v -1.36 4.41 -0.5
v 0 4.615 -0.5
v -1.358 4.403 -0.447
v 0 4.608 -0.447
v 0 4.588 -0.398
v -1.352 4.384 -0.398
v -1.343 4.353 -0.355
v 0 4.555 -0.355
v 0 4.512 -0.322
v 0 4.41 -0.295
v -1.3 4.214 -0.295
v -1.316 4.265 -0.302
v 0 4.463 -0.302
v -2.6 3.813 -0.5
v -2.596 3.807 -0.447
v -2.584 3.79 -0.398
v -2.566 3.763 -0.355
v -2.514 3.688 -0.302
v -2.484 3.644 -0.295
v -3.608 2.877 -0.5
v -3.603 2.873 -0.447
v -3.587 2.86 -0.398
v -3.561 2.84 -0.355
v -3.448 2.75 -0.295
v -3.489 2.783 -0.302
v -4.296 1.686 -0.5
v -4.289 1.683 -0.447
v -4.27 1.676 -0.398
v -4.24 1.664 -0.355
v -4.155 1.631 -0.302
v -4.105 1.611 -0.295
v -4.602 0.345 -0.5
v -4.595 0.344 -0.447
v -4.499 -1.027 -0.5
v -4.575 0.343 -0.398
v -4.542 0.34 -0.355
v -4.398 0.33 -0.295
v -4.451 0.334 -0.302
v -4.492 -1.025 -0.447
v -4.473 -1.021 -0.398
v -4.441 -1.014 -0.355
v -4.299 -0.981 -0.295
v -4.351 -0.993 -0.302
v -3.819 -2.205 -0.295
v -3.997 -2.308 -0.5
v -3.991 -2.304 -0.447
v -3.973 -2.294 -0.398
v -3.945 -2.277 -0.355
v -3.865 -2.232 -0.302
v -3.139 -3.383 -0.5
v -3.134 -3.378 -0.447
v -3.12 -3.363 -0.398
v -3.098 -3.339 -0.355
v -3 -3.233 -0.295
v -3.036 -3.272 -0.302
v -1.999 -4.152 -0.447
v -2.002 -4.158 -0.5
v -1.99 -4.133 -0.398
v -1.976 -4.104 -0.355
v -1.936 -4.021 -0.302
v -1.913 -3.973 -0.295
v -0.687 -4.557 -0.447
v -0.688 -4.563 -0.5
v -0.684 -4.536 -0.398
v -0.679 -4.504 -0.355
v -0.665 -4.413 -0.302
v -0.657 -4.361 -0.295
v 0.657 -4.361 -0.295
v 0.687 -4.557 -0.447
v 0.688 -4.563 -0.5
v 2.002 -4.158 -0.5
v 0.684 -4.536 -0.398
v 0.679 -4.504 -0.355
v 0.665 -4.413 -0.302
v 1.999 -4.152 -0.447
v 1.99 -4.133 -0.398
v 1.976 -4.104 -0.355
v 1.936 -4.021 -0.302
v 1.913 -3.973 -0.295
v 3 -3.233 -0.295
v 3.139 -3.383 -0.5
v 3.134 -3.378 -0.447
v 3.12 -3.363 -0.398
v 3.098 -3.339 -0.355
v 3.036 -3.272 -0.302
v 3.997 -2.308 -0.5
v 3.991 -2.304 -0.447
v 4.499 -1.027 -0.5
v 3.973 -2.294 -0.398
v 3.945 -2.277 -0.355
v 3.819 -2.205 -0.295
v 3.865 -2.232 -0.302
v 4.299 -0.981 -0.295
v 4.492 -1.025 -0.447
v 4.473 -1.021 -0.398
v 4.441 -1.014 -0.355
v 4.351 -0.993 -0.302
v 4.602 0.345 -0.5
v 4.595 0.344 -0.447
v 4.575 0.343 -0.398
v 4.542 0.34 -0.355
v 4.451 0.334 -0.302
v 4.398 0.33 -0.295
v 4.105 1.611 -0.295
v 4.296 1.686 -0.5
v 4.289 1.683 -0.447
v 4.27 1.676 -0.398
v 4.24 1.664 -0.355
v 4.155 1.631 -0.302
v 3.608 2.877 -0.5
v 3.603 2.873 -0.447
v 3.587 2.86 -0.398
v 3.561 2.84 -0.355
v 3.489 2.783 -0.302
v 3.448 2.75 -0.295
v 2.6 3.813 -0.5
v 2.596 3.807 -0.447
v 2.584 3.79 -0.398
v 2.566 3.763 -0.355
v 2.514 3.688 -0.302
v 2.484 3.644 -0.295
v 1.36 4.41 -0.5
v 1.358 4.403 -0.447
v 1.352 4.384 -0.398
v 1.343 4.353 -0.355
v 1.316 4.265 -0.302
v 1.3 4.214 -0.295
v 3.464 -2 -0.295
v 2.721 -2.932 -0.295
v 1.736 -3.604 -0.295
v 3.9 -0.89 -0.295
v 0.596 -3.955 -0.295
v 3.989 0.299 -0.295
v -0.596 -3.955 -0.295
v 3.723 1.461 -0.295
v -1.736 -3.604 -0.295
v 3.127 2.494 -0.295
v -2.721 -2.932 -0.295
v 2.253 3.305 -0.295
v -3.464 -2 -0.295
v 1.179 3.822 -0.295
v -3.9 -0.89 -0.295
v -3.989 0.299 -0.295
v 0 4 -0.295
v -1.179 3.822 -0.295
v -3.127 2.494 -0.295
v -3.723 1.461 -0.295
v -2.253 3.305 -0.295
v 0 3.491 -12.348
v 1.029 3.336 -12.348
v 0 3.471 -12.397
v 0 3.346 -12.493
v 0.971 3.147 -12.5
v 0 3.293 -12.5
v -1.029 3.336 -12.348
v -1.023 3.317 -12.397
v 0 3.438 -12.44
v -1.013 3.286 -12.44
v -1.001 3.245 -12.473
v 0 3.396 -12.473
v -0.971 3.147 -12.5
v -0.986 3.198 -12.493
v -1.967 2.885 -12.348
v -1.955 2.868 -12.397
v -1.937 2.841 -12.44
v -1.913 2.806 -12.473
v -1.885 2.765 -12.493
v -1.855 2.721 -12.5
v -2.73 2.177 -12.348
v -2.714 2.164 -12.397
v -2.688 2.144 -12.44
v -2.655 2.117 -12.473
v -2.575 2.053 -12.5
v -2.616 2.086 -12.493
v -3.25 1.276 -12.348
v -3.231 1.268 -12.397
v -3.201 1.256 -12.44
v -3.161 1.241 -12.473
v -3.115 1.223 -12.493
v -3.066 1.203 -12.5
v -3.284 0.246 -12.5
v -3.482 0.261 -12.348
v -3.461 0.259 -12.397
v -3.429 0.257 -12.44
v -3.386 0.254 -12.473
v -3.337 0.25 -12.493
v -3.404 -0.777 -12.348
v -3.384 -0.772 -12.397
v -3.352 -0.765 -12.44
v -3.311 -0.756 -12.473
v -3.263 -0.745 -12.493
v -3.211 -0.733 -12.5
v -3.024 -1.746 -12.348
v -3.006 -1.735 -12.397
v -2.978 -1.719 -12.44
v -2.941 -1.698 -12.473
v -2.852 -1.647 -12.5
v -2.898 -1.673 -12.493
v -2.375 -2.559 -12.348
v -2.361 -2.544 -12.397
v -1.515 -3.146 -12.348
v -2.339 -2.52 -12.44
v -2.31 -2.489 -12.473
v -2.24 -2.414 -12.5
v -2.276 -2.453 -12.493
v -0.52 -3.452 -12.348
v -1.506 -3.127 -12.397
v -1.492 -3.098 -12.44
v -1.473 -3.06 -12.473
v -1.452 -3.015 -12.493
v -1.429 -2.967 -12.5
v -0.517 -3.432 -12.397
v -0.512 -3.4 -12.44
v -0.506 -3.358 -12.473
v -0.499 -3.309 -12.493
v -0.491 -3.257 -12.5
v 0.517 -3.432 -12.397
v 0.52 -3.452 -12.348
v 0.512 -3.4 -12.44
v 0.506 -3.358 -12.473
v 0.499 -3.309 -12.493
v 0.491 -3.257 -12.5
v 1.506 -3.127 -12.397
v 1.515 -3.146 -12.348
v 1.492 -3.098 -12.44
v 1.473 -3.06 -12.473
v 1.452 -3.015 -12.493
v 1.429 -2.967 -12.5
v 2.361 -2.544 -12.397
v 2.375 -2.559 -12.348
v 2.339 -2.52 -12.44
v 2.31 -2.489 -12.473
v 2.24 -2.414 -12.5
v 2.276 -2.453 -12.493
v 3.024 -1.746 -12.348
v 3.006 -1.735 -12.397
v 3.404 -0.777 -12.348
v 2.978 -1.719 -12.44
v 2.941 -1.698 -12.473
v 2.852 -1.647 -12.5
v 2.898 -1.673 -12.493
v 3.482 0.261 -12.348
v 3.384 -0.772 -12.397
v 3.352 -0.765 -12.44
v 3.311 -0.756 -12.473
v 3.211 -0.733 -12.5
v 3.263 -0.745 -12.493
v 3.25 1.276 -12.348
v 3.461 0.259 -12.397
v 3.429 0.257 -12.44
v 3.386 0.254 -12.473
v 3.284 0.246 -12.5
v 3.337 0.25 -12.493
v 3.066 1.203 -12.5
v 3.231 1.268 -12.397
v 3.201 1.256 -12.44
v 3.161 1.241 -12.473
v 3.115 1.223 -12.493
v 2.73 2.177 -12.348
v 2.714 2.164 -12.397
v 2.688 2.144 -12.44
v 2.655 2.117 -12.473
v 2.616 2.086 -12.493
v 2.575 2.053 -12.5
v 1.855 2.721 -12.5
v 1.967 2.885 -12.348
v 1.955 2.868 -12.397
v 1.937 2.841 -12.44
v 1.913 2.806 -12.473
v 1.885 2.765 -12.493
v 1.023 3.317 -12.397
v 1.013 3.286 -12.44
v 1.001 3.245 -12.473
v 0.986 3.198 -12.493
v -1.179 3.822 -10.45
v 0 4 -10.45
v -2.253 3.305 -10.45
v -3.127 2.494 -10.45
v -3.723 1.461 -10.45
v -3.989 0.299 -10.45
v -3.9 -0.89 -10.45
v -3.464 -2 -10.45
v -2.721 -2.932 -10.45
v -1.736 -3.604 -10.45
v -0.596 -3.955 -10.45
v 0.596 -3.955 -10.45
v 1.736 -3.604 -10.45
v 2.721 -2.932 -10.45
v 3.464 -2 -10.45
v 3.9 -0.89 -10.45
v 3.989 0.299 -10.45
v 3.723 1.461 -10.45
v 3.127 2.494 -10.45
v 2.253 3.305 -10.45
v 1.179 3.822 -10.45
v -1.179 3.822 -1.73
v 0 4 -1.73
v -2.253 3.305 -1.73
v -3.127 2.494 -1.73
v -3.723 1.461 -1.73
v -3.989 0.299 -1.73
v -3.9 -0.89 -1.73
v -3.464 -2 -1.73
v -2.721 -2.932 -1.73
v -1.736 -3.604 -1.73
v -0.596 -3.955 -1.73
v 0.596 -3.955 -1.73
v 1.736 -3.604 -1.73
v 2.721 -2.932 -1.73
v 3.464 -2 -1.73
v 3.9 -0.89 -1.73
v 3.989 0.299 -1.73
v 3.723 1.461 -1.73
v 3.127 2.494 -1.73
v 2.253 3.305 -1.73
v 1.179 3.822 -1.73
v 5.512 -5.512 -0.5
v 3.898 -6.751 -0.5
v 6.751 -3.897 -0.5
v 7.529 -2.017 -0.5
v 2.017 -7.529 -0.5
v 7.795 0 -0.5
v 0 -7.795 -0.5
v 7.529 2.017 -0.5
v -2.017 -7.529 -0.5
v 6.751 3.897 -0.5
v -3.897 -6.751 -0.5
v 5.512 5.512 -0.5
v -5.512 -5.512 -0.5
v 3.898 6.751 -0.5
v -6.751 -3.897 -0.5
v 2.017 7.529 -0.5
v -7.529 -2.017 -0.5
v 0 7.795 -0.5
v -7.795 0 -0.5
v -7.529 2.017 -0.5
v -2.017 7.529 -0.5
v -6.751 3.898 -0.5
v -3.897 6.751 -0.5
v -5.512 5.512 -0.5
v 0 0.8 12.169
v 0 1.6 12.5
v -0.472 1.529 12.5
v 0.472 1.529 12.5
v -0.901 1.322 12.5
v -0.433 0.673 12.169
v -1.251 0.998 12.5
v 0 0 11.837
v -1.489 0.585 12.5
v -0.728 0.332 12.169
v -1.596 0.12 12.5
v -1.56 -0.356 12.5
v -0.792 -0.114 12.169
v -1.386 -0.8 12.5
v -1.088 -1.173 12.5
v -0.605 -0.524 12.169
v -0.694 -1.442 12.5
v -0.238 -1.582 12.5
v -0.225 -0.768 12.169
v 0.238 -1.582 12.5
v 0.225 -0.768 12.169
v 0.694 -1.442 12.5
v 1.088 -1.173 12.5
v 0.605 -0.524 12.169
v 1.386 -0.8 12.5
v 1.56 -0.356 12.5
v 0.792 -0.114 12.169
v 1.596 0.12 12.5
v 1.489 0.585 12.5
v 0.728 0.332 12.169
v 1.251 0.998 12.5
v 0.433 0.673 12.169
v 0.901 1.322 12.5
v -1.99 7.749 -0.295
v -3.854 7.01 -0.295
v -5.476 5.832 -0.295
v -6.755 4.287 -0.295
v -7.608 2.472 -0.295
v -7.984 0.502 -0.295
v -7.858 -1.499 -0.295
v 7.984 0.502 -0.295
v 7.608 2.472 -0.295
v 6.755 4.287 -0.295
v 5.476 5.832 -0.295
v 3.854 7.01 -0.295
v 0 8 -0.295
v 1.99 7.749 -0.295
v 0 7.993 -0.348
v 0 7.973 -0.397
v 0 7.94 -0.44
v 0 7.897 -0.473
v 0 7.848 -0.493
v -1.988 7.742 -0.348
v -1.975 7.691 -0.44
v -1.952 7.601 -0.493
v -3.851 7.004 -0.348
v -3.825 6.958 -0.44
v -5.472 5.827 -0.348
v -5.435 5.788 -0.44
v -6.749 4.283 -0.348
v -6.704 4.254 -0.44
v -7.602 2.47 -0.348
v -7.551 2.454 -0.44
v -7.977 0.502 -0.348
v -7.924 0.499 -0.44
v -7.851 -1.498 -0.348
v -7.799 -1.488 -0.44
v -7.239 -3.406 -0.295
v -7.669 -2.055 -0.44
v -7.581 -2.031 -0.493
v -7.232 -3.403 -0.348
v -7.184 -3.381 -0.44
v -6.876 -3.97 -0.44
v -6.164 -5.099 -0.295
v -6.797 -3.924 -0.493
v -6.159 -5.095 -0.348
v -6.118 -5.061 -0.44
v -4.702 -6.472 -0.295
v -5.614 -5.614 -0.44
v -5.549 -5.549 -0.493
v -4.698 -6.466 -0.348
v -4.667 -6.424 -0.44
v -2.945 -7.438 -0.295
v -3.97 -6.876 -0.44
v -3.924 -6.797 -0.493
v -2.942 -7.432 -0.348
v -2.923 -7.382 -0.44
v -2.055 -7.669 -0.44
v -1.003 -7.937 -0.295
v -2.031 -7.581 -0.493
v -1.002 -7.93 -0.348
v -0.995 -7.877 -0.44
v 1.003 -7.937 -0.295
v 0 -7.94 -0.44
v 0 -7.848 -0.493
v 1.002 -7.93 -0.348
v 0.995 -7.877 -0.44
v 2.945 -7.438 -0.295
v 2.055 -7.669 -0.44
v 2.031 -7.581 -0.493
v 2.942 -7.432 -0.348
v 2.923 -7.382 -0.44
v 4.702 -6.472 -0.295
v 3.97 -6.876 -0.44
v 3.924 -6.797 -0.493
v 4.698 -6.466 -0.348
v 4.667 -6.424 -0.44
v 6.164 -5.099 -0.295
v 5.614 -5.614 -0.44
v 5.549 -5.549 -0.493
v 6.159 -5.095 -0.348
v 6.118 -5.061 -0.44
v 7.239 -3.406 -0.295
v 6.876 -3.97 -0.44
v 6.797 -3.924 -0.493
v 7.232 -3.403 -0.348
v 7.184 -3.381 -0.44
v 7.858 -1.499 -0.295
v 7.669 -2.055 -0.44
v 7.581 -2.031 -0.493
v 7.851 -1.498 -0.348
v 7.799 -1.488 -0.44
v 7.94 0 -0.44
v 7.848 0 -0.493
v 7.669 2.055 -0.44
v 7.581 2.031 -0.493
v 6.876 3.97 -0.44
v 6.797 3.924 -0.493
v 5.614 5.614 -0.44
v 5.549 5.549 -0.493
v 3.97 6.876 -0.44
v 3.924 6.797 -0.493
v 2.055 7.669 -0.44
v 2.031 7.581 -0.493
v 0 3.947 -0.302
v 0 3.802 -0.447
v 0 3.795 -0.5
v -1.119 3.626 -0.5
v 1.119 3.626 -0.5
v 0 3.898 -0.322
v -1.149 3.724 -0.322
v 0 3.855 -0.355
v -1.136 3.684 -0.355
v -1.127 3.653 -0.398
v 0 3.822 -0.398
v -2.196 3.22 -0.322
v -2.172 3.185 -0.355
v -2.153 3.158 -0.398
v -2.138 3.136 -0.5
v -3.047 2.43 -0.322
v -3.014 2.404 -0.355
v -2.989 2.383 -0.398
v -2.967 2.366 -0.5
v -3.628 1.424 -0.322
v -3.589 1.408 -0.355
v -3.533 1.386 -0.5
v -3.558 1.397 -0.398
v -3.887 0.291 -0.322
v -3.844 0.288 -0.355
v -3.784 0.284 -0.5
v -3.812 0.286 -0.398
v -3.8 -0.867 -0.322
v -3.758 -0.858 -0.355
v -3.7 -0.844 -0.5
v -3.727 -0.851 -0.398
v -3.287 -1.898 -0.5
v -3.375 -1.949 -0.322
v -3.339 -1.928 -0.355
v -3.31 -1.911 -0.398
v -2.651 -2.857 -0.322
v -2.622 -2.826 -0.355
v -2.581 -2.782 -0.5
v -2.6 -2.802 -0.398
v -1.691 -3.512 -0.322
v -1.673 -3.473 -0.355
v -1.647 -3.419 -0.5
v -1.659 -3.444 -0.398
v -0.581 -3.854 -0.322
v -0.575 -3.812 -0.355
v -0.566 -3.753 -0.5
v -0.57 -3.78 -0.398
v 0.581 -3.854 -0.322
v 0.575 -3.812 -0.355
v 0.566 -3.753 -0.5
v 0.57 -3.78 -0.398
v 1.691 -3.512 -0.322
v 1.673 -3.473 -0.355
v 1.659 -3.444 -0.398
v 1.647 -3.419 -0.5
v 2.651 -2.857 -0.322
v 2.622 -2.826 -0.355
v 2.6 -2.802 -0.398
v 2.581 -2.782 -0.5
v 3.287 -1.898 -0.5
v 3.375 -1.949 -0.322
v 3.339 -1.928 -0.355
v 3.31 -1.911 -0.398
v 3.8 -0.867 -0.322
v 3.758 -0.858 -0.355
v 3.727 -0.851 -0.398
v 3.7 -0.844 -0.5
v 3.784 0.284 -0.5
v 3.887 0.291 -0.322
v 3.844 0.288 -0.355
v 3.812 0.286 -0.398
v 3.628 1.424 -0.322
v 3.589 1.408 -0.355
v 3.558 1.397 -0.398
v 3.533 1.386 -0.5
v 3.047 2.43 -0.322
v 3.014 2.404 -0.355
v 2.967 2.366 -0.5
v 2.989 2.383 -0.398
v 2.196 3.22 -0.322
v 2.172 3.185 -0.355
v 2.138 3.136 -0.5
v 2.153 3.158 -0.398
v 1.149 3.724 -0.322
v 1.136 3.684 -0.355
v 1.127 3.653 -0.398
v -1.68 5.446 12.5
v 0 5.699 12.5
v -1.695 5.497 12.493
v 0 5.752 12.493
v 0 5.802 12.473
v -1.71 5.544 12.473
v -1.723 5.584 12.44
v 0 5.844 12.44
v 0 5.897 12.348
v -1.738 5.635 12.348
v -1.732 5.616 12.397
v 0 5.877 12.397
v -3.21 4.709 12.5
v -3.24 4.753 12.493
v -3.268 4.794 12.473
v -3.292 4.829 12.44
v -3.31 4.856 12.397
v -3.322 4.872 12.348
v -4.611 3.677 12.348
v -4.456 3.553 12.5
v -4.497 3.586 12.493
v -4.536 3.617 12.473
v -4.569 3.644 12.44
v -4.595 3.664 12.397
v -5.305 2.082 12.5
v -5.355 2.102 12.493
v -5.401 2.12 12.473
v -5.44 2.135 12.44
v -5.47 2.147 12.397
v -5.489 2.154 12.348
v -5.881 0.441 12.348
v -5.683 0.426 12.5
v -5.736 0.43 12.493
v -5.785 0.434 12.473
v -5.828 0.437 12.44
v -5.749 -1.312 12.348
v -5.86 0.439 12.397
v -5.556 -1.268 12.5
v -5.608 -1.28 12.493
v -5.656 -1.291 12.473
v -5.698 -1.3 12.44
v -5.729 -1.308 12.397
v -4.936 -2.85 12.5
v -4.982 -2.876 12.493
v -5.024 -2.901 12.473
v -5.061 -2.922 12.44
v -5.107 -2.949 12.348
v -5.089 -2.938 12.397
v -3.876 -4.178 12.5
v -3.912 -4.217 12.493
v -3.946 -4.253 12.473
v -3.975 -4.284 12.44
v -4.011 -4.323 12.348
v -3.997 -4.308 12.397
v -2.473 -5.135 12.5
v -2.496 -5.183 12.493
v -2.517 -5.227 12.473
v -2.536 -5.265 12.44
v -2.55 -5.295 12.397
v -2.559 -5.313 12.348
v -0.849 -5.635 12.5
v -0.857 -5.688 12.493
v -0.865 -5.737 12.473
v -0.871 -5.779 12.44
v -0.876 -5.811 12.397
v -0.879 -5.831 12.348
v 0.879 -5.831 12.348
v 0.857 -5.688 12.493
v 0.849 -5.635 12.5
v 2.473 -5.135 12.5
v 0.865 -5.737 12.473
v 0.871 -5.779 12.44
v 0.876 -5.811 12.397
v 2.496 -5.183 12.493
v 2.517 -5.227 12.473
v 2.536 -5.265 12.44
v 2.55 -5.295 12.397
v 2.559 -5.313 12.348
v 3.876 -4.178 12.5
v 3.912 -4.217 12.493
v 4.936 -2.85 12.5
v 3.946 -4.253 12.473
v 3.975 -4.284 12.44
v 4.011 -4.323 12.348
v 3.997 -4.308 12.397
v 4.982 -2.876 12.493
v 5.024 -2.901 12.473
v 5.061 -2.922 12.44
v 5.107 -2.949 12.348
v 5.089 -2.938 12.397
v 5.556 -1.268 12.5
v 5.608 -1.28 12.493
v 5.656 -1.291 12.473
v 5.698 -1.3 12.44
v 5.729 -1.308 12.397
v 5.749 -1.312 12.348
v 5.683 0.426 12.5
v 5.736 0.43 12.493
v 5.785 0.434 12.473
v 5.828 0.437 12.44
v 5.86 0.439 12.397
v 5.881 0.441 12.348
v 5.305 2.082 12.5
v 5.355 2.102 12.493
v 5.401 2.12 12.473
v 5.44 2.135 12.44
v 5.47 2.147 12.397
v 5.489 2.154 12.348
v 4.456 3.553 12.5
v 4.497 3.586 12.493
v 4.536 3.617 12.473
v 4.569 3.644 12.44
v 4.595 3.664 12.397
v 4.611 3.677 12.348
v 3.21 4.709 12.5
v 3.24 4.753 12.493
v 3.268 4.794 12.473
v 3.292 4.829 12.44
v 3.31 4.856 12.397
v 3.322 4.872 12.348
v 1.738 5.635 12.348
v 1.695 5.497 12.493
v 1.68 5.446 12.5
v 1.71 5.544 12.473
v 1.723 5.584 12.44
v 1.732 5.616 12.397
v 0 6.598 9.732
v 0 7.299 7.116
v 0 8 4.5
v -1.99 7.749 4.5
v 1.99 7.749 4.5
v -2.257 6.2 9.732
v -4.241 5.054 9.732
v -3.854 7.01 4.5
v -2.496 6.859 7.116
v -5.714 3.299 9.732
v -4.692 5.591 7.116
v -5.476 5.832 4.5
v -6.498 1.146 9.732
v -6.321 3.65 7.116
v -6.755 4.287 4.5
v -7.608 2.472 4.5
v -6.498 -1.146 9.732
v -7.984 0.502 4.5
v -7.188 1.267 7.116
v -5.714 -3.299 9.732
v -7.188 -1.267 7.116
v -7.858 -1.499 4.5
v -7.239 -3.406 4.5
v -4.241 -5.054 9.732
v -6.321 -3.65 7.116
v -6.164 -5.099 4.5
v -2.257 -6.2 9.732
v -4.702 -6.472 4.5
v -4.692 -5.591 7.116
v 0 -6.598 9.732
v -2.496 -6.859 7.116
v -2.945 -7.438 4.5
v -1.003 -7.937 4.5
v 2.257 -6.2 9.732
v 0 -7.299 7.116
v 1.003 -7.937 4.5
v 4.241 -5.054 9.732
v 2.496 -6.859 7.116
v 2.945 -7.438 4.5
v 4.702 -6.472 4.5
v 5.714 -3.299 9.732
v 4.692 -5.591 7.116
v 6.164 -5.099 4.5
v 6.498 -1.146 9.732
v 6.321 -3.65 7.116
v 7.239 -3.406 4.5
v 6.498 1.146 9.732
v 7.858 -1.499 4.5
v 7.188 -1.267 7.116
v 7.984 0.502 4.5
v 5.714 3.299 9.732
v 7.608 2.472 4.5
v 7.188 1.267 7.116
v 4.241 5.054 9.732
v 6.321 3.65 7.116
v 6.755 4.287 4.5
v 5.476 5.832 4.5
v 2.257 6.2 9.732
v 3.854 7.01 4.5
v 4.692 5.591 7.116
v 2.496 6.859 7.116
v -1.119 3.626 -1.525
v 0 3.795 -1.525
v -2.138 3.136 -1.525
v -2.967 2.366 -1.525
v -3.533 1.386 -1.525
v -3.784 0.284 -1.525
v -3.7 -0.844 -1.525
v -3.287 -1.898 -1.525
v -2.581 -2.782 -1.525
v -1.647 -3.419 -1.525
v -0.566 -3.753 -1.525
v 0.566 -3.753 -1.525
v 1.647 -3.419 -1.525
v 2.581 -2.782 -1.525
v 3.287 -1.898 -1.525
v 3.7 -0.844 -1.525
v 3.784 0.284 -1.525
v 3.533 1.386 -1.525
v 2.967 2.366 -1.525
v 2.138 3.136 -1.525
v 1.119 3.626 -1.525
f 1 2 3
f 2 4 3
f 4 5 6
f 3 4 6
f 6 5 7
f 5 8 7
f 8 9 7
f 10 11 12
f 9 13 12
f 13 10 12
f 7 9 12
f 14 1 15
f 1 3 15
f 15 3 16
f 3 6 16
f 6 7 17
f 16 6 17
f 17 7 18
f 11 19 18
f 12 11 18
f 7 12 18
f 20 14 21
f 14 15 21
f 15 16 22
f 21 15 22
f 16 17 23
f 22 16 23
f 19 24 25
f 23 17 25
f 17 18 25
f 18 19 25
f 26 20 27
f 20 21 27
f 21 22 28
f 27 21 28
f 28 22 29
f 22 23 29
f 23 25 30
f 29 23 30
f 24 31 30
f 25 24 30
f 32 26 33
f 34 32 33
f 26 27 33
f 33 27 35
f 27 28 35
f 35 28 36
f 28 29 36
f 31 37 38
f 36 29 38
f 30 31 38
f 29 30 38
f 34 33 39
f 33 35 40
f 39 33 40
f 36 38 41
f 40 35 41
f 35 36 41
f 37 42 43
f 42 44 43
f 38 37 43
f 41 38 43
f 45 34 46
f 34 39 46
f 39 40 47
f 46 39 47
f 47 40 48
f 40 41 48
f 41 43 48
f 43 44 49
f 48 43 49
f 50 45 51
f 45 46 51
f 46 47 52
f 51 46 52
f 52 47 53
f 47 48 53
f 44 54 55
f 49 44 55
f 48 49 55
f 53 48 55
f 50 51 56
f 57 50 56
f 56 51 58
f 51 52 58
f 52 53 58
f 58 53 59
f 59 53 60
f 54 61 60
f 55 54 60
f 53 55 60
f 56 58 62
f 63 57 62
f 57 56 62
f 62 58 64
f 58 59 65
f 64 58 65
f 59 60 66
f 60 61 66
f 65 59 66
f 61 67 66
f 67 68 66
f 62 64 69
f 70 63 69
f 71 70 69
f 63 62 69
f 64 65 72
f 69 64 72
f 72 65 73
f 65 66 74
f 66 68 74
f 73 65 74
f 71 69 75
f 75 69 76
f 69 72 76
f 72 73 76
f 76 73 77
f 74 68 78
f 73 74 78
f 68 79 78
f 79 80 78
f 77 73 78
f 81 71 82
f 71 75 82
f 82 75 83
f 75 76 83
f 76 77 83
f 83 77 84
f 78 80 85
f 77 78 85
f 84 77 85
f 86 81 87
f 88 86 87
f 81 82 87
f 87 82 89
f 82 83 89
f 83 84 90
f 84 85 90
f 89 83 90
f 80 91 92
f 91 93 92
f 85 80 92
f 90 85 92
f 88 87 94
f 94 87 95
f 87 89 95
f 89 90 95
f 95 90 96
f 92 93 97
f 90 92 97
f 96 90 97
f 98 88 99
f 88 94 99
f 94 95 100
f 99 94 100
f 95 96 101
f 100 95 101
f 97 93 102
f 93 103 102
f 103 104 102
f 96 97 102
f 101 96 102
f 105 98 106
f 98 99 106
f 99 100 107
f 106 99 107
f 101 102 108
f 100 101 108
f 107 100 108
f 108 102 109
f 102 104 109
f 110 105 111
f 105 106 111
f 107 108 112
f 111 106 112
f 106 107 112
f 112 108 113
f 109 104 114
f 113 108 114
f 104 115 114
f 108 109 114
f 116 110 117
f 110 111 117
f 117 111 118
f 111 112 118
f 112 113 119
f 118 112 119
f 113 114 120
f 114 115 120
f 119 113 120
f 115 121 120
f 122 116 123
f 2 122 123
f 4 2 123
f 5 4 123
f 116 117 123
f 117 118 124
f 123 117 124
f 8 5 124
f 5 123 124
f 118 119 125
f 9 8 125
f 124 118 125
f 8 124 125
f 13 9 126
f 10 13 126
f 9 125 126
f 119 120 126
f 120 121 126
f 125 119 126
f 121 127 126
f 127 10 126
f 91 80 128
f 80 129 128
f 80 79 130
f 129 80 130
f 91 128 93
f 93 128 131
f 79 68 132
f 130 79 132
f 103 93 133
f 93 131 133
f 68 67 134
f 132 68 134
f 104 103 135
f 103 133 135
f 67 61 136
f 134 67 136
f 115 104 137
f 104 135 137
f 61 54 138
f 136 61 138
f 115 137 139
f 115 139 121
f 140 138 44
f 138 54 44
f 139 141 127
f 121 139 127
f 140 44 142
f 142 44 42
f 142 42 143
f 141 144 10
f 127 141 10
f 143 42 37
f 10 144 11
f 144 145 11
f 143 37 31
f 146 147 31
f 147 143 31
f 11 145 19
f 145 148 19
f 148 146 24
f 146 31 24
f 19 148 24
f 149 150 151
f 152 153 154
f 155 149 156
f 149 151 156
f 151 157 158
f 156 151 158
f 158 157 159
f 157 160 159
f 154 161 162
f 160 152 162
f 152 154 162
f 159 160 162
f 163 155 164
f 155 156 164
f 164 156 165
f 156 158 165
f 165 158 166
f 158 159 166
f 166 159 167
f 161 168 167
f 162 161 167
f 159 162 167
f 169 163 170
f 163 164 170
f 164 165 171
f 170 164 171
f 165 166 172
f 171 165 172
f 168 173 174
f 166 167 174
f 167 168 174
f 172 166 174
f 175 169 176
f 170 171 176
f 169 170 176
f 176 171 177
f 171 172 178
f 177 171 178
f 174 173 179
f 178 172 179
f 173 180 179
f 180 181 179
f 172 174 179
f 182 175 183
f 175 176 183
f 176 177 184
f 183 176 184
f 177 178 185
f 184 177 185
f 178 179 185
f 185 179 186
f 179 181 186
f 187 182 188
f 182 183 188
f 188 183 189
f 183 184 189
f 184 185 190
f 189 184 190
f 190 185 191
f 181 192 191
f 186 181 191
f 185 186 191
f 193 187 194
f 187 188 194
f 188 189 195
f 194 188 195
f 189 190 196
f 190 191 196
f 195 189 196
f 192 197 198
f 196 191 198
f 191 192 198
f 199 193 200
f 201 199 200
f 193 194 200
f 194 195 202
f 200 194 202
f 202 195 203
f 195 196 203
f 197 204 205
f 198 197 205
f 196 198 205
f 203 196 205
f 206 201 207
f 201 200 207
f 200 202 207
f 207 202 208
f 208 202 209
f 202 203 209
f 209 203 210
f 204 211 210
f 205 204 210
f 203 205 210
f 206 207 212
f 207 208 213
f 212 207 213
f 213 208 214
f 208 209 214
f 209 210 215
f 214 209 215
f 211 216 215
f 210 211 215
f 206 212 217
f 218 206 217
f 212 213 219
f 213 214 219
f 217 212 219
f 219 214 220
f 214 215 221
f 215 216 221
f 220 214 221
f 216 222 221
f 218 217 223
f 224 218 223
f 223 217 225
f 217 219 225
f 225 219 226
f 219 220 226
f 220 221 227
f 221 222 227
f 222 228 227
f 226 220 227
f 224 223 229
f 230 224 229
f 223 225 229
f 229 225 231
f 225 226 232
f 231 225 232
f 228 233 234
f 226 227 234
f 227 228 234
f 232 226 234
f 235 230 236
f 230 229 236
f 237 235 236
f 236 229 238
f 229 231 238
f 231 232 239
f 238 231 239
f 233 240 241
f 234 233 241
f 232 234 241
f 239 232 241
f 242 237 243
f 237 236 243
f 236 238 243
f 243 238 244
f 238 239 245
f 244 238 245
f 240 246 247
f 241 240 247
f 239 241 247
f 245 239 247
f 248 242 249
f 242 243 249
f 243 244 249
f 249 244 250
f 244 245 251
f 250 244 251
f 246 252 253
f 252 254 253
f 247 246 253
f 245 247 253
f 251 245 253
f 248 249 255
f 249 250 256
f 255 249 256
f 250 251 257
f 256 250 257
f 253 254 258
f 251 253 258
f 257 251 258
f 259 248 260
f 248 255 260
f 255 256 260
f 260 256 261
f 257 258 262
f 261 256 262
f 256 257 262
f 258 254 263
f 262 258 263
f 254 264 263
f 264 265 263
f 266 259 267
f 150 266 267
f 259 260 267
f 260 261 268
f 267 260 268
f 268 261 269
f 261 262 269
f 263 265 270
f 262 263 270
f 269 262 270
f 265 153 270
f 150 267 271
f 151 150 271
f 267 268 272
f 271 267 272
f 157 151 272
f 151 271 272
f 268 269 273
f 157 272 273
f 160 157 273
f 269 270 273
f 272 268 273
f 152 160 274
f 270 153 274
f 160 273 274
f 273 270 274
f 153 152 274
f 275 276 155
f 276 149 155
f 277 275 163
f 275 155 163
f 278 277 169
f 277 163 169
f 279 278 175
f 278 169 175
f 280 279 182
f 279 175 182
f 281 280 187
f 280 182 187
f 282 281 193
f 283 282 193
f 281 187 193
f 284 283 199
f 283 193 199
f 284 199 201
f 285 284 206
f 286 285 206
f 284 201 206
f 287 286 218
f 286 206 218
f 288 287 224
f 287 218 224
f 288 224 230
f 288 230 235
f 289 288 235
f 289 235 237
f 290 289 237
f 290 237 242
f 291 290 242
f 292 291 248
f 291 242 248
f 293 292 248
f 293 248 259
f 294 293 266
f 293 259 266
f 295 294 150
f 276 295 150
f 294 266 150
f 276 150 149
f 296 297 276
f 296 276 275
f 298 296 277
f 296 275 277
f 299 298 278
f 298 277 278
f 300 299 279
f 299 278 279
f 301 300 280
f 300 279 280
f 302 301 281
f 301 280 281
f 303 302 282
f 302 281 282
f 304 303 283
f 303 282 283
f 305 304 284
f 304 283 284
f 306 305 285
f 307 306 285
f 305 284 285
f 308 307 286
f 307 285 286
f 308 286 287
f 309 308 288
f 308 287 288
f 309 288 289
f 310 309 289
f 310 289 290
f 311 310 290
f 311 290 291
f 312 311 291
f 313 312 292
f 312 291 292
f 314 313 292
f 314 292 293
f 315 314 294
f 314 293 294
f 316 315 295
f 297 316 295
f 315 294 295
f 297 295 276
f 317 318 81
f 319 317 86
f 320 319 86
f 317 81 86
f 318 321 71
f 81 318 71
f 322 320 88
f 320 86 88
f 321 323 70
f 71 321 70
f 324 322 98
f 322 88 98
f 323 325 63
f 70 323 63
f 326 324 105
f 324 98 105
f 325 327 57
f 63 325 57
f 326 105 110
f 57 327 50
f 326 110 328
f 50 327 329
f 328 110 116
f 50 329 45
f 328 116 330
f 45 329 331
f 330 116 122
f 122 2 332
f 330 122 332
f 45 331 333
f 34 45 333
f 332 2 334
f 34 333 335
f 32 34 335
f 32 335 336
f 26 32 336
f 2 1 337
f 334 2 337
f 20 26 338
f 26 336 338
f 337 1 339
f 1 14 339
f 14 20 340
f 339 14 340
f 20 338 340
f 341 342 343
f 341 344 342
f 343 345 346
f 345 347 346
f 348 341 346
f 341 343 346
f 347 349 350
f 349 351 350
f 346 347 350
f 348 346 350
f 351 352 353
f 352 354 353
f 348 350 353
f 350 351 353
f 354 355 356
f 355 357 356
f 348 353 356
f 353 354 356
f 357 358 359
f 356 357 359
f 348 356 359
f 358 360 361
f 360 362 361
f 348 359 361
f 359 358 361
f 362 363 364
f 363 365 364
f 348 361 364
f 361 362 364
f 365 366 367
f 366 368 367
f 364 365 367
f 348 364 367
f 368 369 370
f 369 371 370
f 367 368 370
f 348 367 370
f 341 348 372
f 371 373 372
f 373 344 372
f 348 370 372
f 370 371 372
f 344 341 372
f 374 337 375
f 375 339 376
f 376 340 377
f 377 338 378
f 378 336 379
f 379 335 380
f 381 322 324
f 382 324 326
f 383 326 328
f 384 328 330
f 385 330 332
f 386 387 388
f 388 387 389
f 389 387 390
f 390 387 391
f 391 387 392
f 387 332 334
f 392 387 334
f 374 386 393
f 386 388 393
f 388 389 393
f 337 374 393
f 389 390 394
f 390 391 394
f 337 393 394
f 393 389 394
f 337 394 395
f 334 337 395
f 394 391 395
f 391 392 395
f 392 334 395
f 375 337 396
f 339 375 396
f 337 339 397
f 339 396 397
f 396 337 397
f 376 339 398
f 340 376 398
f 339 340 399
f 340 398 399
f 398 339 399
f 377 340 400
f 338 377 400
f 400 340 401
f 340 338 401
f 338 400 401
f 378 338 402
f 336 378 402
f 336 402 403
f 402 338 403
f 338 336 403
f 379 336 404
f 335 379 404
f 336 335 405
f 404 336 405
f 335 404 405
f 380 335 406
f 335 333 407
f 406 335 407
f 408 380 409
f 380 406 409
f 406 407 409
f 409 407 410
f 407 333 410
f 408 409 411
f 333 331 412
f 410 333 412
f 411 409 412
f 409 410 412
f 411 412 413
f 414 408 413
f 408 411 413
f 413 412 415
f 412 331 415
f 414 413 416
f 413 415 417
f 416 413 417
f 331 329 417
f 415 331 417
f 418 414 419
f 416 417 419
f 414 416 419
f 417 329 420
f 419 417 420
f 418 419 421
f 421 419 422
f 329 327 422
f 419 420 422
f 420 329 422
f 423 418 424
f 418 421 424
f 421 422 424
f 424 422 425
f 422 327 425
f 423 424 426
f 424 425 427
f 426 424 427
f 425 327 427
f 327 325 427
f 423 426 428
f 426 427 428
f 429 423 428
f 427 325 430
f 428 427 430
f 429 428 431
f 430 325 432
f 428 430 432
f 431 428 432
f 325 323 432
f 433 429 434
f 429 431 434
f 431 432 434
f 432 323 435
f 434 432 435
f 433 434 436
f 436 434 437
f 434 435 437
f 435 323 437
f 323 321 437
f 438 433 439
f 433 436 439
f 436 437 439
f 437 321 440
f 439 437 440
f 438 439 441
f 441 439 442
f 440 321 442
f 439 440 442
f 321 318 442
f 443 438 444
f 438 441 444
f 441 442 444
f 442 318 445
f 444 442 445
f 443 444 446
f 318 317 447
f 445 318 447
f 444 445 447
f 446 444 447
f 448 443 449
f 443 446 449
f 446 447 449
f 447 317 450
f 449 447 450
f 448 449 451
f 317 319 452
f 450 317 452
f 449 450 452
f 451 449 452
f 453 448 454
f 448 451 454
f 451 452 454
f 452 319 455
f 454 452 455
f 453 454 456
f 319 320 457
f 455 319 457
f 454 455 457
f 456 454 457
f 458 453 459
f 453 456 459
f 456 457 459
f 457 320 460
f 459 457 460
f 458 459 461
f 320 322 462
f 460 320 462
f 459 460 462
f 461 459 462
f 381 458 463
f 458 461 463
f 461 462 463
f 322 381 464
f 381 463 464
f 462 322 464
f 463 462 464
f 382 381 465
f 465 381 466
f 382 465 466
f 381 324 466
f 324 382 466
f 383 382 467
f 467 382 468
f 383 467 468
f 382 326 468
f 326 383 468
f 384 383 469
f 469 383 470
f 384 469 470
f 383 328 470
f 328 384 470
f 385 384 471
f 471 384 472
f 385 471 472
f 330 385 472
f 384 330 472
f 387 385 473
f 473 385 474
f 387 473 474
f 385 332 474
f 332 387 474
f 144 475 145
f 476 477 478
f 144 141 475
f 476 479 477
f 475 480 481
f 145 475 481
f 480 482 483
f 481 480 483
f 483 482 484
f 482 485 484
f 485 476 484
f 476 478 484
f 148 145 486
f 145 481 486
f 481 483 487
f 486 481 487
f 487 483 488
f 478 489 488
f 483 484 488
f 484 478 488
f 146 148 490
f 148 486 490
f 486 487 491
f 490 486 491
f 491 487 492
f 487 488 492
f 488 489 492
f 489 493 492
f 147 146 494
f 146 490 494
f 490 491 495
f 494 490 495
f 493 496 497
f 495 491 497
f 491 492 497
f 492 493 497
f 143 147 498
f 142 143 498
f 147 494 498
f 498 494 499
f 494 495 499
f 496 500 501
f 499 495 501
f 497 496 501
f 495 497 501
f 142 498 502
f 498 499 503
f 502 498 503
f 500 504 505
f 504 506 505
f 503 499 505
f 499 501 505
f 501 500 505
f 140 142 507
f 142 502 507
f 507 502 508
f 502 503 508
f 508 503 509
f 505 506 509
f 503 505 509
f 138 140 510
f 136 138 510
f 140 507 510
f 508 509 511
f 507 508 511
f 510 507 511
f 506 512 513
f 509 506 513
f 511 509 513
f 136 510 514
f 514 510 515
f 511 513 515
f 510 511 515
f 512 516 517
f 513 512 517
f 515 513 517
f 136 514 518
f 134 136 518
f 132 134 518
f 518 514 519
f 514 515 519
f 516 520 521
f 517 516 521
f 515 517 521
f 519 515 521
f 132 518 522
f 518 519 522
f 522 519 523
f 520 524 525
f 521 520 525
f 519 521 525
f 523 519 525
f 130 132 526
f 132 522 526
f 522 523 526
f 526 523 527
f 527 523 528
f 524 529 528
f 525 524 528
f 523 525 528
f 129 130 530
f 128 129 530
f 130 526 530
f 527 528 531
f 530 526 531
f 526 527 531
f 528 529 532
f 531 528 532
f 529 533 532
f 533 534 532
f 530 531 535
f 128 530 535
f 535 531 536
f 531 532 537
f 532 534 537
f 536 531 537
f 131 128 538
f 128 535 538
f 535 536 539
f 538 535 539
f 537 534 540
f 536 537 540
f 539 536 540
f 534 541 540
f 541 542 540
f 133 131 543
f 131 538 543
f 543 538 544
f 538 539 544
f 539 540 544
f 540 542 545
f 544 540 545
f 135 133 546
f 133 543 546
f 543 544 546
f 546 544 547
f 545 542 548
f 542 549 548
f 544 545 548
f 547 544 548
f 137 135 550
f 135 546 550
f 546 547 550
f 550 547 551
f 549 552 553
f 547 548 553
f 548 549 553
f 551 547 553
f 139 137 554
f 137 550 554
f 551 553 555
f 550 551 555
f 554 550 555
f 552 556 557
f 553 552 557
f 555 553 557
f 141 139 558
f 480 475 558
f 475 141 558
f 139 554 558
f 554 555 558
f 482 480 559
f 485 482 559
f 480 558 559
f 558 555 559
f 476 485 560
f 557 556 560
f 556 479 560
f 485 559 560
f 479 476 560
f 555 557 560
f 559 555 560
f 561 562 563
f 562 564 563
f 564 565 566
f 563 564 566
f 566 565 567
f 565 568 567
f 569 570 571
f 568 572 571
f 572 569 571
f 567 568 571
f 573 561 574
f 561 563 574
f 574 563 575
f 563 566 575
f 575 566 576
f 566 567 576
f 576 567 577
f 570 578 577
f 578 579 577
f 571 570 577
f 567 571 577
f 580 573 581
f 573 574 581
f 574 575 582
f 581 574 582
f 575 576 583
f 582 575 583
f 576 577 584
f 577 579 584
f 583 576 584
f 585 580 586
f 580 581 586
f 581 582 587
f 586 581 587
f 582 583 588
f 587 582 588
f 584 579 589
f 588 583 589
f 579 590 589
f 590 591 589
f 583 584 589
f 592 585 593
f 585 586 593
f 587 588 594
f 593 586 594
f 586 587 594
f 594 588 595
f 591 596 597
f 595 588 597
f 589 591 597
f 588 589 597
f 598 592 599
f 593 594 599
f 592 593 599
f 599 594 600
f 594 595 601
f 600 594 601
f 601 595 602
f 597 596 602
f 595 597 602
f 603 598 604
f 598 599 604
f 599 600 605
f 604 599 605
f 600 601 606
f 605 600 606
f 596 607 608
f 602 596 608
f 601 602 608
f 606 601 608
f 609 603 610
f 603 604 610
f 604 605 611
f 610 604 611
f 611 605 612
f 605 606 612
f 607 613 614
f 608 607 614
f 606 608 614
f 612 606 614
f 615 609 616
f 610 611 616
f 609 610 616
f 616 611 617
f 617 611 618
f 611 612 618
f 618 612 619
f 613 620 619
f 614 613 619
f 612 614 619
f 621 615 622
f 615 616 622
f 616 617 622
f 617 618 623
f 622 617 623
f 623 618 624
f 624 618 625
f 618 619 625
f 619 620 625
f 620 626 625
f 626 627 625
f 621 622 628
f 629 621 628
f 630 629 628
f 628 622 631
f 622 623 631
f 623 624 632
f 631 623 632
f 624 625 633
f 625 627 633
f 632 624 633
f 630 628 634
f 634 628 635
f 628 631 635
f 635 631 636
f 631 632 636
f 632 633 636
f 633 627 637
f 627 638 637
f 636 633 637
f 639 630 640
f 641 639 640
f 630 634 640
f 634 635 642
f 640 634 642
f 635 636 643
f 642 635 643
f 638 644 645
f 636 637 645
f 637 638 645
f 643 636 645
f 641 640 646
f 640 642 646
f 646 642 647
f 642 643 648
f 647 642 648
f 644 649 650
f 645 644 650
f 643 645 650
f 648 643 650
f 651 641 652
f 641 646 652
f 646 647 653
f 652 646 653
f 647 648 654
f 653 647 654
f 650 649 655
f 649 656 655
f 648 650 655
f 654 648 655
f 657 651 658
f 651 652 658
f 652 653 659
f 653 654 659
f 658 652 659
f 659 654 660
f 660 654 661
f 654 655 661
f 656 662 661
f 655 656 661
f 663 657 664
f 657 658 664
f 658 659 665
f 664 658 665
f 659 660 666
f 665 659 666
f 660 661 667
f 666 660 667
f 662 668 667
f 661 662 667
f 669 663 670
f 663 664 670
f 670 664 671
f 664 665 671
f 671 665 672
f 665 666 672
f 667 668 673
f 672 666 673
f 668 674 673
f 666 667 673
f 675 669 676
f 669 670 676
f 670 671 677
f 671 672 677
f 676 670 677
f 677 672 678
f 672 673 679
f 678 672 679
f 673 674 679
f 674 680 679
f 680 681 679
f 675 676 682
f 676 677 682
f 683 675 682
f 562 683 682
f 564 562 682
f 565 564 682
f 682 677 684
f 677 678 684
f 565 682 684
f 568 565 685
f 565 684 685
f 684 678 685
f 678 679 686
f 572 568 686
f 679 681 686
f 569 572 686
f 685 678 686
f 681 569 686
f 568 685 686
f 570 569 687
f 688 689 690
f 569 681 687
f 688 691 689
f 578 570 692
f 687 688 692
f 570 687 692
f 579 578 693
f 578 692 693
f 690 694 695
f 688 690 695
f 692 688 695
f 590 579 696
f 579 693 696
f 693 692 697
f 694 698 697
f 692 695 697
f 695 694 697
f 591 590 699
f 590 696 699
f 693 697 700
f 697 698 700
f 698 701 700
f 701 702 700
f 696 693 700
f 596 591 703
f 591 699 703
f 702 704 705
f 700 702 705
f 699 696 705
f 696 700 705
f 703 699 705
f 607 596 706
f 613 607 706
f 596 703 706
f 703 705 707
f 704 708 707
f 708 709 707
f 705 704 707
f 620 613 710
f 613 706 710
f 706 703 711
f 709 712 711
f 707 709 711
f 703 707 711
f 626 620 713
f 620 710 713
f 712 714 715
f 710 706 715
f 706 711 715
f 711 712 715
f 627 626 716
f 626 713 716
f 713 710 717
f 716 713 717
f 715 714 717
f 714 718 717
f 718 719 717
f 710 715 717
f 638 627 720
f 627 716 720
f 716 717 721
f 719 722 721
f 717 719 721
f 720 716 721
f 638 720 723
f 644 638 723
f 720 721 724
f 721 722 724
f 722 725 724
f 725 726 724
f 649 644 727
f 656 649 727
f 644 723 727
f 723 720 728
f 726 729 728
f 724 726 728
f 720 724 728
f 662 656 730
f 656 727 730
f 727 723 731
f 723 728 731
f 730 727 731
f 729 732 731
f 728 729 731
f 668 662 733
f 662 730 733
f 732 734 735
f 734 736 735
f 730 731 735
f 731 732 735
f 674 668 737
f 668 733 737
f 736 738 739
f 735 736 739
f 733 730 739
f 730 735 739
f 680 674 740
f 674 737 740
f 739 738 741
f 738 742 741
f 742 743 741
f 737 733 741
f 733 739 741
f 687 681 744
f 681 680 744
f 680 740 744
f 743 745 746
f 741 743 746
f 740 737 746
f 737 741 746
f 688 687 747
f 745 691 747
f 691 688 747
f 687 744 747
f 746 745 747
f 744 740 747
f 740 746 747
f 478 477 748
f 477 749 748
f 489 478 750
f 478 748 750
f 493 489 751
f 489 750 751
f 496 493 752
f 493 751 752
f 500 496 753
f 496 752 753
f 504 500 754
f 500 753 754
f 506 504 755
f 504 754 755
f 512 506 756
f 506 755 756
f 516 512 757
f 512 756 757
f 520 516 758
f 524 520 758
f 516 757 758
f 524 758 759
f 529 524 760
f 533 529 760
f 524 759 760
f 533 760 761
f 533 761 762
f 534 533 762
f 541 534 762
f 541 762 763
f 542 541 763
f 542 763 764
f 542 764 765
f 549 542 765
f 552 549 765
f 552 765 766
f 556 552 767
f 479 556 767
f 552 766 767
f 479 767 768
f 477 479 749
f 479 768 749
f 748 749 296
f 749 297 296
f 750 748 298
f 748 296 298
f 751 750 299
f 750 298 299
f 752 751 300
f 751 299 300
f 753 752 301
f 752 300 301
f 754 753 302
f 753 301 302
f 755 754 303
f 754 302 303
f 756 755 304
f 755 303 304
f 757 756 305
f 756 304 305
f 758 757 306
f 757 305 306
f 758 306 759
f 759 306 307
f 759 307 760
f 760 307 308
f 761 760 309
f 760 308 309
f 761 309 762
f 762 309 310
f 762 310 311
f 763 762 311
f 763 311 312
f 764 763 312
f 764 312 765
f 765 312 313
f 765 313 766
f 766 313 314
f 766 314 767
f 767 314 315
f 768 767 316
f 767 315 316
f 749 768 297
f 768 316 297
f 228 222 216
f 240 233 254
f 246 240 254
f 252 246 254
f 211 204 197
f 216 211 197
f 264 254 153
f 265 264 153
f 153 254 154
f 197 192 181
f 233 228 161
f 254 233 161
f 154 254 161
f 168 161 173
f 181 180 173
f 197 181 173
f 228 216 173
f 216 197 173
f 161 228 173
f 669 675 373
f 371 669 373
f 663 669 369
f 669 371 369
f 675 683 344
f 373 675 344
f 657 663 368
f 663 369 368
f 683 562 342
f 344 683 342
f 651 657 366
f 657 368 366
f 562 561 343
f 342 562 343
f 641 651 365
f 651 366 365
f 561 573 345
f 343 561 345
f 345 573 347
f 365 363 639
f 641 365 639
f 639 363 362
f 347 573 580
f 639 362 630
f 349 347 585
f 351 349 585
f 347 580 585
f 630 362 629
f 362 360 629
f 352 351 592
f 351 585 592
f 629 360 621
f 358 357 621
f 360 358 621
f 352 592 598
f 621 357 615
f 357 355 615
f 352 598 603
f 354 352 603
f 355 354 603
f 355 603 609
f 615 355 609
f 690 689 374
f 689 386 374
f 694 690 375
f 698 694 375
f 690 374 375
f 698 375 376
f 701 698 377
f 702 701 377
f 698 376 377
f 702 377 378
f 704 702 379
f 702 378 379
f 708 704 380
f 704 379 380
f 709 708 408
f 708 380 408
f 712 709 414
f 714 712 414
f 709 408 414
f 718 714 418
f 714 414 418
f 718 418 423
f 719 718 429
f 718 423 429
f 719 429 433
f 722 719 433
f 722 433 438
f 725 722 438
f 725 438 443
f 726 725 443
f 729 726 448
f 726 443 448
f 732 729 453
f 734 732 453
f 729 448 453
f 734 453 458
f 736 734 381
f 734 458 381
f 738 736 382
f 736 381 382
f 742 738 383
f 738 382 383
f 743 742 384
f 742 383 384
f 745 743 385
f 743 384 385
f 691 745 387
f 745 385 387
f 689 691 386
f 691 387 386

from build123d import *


with BuildPart() as part:
    # Sketch1 → Revolve1 (revolve)
    with BuildSketch(Plane(origin=(0, 0, 0), x_dir=(0, 0, -1), z_dir=(1, 0, 0))):
        with BuildLine():
            Line((-12.5, 1.6), (-12.5, 5.699104428))
            ThreePointArc((-12.5, 5.699104428), (-12.457637435, 5.823900521), (-12.348057904, 5.897119222))
            Line((-12.348057904, 5.897119222), (-4.5, 8))
            Line((-4.5, 8), (0.295, 8))
            ThreePointArc((0.295, 8), (0.43995689, 7.93995689), (0.5, 7.795))
            Line((0.5, 7.795), (0.5, 4.615))
            ThreePointArc((0.5, 4.615), (0.35504311, 4.55495689), (0.295, 4.41))
            Line((0.295, 4.41), (0.295, 4))
            ThreePointArc((0.295, 4), (0.35504311, 3.85504311), (0.5, 3.795))
            Line((0.5, 3.795), (1.525, 3.795))
            Line((1.525, 3.795), (1.73, 4))
            Line((1.73, 4), (10.45, 4))
            Line((10.45, 4), (12.348057904, 3.491416917))
            ThreePointArc((12.348057904, 3.491416917), (12.457637435, 3.418198216), (12.5, 3.293402123))
            Line((12.5, 3.293402123), (12.5, 0))
            Line((12.5, 0), (-11.8372583, 0))
            Line((-11.8372583, 0), (-12.5, 1.6))
        make_face()
    revolve(axis=Axis((0, 0, -12.5), (0, 0, 1)))


solid = part.part
